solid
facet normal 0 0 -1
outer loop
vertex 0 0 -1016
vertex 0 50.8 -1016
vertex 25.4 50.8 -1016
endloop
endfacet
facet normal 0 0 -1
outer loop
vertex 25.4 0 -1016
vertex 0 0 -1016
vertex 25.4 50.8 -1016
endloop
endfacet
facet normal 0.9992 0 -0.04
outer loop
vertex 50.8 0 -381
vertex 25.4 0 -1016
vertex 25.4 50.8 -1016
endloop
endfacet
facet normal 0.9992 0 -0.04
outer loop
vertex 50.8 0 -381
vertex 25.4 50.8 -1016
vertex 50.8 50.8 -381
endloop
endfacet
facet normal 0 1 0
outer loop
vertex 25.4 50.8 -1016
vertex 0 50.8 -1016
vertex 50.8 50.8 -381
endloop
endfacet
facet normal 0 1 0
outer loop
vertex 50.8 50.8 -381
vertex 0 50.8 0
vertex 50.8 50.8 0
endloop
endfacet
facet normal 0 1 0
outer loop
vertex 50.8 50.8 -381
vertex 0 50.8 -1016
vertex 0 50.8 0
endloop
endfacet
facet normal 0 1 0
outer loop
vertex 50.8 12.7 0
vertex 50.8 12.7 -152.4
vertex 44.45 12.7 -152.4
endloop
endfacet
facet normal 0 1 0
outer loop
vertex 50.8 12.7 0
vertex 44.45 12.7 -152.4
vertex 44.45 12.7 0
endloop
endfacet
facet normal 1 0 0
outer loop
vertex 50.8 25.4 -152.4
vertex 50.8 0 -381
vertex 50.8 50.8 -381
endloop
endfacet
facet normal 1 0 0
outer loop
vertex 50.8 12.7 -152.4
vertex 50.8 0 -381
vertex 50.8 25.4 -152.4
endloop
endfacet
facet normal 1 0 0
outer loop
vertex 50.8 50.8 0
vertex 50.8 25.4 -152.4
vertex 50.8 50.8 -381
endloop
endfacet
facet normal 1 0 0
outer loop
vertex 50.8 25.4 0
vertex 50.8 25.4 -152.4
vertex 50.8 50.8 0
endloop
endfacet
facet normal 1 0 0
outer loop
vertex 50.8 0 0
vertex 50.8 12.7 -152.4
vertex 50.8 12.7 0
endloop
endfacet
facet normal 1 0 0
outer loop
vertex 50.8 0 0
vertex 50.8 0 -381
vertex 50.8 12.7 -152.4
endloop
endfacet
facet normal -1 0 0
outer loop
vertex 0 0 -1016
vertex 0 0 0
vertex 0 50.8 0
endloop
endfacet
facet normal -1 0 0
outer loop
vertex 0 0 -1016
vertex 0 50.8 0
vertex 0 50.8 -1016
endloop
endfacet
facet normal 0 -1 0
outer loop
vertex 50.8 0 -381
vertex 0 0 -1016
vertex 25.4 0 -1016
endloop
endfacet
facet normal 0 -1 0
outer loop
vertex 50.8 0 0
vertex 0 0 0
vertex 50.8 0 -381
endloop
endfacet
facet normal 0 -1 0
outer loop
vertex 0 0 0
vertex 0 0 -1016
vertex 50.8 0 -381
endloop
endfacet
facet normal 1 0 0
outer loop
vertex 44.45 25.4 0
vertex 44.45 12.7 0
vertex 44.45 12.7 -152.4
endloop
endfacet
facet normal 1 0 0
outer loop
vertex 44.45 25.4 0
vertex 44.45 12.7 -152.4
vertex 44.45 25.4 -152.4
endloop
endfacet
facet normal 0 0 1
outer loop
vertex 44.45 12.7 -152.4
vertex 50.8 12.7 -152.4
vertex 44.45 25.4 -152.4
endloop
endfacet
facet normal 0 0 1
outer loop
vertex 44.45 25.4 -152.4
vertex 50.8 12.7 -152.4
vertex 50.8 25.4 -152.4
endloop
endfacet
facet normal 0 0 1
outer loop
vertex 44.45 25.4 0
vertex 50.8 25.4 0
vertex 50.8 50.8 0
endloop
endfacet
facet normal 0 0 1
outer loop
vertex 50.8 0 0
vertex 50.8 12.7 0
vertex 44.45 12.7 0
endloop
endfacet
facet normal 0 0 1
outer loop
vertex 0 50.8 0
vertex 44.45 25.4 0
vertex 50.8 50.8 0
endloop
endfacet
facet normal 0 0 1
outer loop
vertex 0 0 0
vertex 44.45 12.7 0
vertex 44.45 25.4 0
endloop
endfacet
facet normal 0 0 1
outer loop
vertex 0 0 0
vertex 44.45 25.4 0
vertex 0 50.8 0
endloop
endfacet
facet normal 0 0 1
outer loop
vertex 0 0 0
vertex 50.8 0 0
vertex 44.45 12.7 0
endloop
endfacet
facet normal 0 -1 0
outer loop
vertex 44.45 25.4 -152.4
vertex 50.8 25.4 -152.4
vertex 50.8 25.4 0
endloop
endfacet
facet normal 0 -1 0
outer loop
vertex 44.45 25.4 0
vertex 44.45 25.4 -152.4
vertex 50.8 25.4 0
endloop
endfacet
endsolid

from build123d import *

# Parameters (mm, degrees)
F1_DEPTH = 50.8
F2_W     = 12.7
F2_H     = 152.4
F3_DEPTH = 6.35


# Not quite as in the source:
# - a feature names something its author has since deleted; it is built from what else it names


with BuildPart() as f1:
    # F0 (on Front) → F1 (new body)
    with BuildSketch(Plane.XZ):
        Polygon((50.8, 0), (0, 0), (0, -1016), (25.4, -1016), (50.8, -381), align=None)
    extrude(amount=-F1_DEPTH)

    # F2 (on face) → F3 (cut)
    with BuildSketch(Plane.YZ.offset(50.8)):
        with Locations((19.05, -76.2)):
            Rectangle(F2_W, F2_H)
    extrude(amount=-F3_DEPTH, mode=Mode.SUBTRACT)


solid = f1.part
